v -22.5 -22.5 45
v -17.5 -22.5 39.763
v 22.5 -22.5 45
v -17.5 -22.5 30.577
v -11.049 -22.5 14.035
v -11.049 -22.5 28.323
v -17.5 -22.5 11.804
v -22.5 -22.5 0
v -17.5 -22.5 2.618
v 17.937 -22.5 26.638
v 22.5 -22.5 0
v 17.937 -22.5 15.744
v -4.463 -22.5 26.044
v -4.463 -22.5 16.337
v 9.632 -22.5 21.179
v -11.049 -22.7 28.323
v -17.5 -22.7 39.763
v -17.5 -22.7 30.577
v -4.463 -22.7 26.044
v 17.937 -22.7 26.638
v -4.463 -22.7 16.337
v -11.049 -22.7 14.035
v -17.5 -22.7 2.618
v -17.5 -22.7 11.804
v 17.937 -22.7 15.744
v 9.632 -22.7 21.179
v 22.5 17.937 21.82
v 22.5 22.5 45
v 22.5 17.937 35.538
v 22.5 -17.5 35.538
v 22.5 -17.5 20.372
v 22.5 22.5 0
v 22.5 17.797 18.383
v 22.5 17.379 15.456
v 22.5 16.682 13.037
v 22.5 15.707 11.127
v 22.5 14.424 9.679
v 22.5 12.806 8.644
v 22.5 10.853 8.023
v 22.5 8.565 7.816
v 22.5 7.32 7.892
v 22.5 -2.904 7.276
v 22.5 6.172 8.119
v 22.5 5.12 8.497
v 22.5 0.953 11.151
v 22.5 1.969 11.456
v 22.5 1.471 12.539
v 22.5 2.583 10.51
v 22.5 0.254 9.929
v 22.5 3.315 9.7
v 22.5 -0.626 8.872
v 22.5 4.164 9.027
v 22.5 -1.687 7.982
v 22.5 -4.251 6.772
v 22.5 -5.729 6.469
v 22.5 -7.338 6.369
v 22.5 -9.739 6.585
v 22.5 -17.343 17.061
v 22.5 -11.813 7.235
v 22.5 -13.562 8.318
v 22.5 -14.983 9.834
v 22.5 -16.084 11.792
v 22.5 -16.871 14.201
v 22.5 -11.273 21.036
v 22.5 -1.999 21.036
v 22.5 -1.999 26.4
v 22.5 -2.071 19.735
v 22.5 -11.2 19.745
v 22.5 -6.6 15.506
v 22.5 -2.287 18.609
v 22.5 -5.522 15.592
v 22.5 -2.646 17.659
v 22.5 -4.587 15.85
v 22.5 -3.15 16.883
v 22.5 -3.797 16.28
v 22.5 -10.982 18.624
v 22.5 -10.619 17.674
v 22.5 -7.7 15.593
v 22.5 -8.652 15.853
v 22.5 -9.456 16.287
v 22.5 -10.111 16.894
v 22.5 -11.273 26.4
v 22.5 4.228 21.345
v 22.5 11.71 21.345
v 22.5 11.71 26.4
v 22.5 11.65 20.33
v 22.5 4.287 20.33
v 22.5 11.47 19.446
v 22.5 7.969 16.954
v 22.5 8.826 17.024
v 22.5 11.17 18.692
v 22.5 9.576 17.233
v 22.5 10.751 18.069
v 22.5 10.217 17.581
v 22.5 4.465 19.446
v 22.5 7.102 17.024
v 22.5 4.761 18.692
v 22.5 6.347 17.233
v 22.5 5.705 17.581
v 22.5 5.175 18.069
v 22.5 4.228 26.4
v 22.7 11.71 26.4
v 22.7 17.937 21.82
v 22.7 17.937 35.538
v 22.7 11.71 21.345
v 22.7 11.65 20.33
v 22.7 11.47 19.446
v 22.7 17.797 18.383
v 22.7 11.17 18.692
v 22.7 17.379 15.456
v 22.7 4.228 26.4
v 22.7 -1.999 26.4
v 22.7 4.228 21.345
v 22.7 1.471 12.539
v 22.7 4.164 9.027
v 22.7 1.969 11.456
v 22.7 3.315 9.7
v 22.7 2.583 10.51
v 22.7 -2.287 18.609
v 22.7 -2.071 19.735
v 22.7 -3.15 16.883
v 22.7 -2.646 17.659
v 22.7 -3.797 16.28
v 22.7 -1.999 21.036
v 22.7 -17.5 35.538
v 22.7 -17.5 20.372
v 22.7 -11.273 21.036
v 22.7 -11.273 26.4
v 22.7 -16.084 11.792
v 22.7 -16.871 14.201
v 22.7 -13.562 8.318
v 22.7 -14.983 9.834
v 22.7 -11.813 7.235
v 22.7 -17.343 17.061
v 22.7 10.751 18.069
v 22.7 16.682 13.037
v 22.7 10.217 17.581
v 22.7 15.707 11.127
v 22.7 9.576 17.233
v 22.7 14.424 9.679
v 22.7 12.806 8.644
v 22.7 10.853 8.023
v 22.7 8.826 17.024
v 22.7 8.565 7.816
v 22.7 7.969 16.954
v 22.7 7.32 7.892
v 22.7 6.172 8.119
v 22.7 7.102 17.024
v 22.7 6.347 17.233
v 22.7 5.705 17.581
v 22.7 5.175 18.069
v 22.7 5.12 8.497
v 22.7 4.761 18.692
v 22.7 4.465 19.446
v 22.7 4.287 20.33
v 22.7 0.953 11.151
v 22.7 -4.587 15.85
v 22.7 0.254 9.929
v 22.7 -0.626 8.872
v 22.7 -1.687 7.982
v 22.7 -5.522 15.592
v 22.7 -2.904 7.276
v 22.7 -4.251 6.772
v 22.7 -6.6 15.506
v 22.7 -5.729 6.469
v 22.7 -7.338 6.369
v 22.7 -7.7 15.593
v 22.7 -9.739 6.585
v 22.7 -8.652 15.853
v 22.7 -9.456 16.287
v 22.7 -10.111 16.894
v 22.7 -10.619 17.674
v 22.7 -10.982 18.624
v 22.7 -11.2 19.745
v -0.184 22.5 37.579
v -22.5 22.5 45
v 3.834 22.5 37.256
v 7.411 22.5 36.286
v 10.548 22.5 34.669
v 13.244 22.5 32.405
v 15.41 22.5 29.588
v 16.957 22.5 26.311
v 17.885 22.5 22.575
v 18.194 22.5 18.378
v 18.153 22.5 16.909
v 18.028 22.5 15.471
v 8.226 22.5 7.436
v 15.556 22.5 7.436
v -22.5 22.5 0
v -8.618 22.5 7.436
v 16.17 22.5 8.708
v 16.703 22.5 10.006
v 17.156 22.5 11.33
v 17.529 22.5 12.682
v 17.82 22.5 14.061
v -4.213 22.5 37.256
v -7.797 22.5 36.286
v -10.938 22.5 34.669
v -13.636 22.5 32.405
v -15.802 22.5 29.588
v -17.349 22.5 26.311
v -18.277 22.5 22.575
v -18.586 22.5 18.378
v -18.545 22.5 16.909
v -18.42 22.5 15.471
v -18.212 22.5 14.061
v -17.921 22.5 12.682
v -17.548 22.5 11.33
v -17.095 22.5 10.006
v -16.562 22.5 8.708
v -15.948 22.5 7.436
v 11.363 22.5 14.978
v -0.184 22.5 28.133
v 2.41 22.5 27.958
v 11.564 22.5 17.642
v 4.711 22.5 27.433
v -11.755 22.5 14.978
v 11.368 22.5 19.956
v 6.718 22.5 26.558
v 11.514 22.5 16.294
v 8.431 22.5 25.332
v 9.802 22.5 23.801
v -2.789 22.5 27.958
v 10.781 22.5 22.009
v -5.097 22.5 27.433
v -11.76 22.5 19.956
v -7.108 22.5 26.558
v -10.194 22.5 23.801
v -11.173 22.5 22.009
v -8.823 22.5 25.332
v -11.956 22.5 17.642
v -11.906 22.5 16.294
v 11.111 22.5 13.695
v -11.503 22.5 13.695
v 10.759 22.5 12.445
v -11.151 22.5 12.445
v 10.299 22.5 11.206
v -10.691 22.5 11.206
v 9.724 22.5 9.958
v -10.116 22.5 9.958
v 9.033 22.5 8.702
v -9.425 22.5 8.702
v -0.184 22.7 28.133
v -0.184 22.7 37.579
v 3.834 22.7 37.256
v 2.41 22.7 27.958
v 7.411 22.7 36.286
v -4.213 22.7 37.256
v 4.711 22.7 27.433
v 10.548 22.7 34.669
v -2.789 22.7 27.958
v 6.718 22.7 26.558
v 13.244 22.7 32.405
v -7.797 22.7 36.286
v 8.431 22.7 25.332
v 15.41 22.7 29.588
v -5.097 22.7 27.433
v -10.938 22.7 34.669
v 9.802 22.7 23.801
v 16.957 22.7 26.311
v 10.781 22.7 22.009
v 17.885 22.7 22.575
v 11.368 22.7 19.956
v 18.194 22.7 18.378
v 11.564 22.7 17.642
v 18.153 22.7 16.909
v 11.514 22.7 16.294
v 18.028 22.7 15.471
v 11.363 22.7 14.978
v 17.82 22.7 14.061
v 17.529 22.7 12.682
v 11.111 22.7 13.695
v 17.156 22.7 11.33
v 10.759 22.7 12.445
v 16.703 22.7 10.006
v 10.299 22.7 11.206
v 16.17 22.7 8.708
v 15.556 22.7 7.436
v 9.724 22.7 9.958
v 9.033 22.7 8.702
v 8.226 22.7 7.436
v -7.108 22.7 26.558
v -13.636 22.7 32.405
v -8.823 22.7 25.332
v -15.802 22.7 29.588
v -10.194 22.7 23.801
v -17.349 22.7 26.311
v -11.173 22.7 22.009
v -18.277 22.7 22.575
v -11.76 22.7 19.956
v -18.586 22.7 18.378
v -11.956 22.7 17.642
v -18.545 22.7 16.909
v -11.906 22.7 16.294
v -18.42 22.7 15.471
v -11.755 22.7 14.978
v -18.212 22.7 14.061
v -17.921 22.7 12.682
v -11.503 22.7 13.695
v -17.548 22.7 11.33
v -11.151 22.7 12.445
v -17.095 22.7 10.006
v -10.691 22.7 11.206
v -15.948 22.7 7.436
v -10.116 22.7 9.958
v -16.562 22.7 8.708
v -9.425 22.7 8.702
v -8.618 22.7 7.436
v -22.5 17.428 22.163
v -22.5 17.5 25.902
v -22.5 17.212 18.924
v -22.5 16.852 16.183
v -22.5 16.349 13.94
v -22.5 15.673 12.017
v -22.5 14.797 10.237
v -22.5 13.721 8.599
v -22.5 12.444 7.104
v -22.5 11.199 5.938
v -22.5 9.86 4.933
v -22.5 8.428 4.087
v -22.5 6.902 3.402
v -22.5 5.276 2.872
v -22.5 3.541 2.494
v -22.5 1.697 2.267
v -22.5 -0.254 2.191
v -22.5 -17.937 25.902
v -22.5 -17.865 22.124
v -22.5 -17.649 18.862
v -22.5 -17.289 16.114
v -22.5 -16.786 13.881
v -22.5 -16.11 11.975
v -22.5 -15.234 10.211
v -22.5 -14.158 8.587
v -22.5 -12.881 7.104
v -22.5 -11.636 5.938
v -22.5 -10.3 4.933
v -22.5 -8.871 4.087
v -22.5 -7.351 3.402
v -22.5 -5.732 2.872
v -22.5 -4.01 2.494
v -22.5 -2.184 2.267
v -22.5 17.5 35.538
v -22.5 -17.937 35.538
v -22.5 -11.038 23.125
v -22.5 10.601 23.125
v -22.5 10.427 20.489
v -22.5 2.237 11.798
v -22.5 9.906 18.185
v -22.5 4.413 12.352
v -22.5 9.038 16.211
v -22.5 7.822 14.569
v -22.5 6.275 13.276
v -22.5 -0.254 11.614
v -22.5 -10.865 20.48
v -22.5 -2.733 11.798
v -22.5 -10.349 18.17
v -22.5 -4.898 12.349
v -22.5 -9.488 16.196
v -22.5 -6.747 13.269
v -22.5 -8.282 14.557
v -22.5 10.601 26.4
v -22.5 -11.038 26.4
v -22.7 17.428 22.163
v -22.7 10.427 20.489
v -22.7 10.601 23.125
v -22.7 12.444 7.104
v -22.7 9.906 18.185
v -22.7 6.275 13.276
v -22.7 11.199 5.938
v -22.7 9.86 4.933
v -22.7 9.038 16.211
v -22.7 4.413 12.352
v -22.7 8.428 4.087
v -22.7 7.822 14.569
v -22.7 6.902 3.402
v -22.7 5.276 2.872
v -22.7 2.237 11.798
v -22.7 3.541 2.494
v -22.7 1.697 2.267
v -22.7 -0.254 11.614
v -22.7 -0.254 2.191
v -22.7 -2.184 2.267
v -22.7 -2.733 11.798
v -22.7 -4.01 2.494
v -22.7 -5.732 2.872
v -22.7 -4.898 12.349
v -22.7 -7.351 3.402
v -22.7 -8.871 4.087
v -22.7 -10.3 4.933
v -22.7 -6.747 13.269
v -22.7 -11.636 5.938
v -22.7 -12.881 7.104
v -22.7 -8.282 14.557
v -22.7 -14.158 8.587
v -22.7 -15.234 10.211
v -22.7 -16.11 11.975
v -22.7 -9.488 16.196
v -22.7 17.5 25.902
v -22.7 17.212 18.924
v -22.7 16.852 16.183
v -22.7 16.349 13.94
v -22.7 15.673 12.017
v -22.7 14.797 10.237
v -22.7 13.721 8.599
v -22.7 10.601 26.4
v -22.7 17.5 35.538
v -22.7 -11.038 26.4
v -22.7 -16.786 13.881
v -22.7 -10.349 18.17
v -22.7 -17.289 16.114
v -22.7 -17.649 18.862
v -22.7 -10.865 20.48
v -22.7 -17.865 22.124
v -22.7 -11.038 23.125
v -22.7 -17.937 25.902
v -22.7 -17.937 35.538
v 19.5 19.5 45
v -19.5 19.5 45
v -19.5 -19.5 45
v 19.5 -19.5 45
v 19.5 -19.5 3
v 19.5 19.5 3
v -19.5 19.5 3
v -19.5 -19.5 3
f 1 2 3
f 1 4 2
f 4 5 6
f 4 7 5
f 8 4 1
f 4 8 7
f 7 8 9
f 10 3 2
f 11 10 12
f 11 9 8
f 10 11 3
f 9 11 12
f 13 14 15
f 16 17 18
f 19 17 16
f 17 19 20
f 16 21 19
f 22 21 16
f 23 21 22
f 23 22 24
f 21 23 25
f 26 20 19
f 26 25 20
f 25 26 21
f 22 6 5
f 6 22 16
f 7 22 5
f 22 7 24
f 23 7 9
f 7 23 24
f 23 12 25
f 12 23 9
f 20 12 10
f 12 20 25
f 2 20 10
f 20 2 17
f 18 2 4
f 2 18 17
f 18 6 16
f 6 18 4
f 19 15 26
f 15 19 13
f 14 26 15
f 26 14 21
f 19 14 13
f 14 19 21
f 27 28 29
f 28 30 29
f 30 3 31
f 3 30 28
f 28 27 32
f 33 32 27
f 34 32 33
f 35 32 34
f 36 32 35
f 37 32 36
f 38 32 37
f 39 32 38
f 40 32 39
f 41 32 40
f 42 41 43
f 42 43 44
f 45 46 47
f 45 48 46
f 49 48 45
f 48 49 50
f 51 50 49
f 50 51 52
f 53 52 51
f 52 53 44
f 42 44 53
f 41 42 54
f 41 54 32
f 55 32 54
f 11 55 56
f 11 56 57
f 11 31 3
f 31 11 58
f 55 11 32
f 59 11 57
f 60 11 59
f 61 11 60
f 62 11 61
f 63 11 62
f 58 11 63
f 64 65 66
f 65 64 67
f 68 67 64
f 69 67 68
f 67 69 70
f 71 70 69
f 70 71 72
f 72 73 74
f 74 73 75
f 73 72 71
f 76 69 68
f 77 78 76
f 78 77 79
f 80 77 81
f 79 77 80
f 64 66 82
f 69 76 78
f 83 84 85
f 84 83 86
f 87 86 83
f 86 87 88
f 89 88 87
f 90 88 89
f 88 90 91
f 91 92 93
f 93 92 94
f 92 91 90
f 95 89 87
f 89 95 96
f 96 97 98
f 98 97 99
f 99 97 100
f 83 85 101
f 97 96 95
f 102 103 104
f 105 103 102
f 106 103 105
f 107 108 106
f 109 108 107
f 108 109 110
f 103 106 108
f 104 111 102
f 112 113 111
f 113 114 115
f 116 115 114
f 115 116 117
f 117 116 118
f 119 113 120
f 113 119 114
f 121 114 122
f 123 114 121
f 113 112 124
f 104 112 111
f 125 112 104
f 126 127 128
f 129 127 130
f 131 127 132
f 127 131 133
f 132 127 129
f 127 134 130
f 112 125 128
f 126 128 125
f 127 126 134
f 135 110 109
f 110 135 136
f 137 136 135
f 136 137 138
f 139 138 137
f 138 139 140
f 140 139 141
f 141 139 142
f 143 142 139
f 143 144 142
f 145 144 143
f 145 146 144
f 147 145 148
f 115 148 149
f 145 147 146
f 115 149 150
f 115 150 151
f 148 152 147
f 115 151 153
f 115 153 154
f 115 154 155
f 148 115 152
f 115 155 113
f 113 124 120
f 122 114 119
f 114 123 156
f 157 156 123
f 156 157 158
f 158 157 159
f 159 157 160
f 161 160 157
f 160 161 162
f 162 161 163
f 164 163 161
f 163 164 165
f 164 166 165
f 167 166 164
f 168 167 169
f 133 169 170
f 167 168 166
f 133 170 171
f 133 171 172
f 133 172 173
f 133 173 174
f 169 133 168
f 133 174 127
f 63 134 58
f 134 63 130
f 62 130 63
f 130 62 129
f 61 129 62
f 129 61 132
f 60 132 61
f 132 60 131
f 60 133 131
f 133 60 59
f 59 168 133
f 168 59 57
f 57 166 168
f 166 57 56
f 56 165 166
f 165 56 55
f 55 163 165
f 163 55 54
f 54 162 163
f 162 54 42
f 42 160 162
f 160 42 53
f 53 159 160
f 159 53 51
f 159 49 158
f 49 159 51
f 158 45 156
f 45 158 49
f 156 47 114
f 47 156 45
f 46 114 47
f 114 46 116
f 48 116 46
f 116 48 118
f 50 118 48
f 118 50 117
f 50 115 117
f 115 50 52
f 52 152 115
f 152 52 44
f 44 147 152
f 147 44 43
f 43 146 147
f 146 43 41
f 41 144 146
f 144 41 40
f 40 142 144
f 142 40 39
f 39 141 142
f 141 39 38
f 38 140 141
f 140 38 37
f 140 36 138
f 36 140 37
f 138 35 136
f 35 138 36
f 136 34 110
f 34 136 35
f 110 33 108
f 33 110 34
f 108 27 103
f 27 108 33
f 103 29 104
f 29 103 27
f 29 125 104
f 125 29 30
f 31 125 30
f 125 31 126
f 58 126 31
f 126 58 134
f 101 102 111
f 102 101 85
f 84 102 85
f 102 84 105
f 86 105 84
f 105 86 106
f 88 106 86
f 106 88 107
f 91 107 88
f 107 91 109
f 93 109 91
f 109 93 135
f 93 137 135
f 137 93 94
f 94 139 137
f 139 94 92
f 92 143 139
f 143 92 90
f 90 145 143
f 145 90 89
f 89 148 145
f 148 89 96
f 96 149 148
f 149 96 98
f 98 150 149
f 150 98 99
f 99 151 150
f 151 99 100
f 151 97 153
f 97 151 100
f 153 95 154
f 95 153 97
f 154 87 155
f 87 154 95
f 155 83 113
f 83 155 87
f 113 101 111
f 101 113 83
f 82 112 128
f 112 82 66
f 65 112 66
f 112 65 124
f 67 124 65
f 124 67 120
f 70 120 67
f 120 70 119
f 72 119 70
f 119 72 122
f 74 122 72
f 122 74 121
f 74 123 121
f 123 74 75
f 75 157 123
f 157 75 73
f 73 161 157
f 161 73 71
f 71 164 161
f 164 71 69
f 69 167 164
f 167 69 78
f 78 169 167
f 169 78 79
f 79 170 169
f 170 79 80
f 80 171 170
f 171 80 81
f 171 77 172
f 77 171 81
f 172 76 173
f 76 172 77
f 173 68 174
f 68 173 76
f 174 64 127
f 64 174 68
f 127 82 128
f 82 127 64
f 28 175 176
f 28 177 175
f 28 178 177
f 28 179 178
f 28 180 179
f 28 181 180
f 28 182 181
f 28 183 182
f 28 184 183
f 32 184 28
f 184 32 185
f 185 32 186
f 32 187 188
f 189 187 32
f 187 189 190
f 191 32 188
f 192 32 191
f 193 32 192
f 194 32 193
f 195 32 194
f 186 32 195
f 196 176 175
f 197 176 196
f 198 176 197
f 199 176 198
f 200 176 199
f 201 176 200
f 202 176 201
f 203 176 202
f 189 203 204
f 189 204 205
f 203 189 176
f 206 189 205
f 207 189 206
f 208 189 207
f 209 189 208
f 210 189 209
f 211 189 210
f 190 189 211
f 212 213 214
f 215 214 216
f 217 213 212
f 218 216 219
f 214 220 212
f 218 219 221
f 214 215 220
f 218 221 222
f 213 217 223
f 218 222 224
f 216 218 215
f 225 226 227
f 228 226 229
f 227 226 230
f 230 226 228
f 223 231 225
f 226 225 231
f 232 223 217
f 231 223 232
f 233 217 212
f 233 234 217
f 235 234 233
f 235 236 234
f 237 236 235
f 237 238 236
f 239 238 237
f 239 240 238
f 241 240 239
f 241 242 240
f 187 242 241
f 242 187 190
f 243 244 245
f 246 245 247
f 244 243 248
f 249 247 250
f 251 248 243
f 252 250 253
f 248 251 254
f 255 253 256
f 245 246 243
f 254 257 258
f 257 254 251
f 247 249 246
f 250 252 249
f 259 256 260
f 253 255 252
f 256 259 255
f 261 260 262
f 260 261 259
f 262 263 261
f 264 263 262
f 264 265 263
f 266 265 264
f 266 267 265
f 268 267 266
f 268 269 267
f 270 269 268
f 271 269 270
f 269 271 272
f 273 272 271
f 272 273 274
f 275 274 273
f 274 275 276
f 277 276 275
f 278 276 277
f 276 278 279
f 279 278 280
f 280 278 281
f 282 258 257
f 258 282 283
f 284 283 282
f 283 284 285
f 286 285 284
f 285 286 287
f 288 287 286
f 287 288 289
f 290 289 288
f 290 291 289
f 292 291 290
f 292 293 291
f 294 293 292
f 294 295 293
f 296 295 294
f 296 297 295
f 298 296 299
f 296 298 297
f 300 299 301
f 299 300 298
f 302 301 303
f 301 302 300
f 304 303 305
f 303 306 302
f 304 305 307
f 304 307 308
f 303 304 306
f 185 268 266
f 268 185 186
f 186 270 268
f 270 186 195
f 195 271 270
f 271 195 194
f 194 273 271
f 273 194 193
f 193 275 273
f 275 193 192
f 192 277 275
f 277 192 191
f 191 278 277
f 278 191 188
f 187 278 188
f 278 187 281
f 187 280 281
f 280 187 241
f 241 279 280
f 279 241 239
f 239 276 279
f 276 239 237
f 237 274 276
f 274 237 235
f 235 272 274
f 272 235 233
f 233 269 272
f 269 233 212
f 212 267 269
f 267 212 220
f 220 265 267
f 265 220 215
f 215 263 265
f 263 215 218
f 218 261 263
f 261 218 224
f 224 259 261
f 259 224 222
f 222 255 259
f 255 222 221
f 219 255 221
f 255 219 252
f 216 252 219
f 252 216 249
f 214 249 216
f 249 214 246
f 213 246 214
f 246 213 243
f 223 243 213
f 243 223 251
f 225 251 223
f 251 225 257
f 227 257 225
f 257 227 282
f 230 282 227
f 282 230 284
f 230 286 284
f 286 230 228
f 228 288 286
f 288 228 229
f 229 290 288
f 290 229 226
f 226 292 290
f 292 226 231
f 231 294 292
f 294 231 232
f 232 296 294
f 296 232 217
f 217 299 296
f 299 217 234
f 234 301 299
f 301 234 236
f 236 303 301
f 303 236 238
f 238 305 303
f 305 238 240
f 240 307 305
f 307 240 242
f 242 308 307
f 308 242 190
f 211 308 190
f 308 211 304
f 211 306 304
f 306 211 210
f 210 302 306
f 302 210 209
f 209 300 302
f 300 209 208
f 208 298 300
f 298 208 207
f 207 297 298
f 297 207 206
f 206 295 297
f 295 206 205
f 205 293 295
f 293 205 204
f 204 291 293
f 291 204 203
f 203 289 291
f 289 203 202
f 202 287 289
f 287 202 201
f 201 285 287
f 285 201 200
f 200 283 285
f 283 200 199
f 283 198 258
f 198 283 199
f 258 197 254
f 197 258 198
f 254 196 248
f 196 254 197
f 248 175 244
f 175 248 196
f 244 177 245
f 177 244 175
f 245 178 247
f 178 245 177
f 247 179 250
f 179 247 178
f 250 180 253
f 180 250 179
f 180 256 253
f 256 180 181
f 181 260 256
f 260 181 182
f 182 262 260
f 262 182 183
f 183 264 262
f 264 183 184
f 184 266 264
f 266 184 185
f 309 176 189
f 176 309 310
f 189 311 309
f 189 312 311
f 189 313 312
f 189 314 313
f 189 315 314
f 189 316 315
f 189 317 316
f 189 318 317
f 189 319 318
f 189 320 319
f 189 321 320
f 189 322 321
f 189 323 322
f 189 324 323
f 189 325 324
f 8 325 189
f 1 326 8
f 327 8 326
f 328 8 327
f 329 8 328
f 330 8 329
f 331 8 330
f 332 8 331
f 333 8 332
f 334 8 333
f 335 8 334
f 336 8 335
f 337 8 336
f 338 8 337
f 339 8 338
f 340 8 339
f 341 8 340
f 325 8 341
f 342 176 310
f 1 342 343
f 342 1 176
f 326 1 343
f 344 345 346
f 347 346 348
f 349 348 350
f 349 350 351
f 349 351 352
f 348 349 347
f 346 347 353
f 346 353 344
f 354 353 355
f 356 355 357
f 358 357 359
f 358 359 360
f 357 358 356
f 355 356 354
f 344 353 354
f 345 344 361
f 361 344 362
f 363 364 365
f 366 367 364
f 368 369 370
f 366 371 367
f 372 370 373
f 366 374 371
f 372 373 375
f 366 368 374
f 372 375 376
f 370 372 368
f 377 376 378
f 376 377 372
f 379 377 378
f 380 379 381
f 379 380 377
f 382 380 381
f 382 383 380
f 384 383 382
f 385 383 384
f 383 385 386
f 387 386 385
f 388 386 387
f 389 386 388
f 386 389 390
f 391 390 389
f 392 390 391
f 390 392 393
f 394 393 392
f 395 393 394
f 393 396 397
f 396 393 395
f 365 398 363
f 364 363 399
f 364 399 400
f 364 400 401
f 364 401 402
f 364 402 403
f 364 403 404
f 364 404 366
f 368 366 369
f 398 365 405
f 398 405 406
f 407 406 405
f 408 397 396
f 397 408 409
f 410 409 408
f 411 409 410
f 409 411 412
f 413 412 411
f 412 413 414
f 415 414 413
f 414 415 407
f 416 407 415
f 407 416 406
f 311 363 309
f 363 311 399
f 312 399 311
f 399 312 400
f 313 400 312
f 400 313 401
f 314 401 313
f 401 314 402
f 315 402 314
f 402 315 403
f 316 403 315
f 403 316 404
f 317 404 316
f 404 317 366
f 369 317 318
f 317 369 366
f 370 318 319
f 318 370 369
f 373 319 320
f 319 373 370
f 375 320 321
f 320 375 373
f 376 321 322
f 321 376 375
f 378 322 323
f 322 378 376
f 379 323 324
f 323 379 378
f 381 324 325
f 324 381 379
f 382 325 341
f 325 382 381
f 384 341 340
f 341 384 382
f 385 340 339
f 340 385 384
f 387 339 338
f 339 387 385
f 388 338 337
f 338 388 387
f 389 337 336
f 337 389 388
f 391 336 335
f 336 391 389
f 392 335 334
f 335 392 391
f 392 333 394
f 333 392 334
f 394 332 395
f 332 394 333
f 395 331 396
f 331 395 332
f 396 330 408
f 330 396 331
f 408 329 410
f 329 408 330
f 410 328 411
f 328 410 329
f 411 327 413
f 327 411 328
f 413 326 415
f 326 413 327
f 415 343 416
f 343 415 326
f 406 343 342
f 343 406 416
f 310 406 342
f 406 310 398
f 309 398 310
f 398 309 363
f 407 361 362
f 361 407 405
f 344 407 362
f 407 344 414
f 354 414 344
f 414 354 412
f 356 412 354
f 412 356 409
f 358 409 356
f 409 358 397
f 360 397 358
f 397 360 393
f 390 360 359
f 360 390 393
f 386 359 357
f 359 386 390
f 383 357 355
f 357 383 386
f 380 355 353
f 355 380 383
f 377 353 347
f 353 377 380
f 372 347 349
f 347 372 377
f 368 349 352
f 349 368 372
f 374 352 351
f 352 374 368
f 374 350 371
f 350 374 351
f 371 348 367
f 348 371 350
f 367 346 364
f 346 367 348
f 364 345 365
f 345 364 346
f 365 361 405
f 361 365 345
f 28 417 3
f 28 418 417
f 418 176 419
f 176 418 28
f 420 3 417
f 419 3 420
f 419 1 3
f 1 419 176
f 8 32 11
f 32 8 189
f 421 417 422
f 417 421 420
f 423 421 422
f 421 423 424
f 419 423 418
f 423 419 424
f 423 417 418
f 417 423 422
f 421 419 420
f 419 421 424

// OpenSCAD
cube_size = 45;
cube_wall_thickness = 3;
text_border_margin = 3;  // outer
text_border_padding = 2; // inner

assert(cube_size > 2 * cube_wall_thickness);

module letter (character, size, center=[0,0,0], rotation=[0,0,0]) {
    char_len = len(character);
    assert(char_len == 1, str("A letter cannot contain more than one character. '", character, "' contains ", char_len));

    translate_shift = text_border_margin + text_border_padding;
    // TODO set to 0,0
    //translate([size/2, 0, size/2])
    translate(center)
    rotate(rotation)
    linear_extrude(0.2)
    translate([-size/2,-size/2])
    text(character, size, font="Lato:style=Bold");
}

module hollow_cube(size, wall_thickness) {
    difference() {
        cube(size);
        let (inner_size = size - 2*wall_thickness) {
            translate([wall_thickness, wall_thickness, wall_thickness])
            cube([inner_size, inner_size, size-wall_thickness]);
        }
    }
}

module letter_cube(size, wall_thickness) {
    translate([-size/2, -size/2, 0])
    hollow_cube(size, wall_thickness);
}


let (
        translate_shift = text_border_margin + text_border_padding,
        letter_size = cube_size-2*translate_shift,
        letter_shift = cube_size/2
    ) {
        echo(letter_size);
    #letter("A", letter_size, center=[0, -letter_shift, letter_shift], rotation=[90, 90, 0]);
    #letter("B", letter_size, center=[letter_shift, 0, letter_shift], rotation=[0,90,0]);
    letter("C", letter_size, center=[0, letter_shift, letter_shift], rotation=[0,90,90]);
    letter("D", letter_size, center=[-letter_shift, 0, letter_shift], rotation=[180,90,0]);
}

letter_cube(cube_size, cube_wall_thickness);
